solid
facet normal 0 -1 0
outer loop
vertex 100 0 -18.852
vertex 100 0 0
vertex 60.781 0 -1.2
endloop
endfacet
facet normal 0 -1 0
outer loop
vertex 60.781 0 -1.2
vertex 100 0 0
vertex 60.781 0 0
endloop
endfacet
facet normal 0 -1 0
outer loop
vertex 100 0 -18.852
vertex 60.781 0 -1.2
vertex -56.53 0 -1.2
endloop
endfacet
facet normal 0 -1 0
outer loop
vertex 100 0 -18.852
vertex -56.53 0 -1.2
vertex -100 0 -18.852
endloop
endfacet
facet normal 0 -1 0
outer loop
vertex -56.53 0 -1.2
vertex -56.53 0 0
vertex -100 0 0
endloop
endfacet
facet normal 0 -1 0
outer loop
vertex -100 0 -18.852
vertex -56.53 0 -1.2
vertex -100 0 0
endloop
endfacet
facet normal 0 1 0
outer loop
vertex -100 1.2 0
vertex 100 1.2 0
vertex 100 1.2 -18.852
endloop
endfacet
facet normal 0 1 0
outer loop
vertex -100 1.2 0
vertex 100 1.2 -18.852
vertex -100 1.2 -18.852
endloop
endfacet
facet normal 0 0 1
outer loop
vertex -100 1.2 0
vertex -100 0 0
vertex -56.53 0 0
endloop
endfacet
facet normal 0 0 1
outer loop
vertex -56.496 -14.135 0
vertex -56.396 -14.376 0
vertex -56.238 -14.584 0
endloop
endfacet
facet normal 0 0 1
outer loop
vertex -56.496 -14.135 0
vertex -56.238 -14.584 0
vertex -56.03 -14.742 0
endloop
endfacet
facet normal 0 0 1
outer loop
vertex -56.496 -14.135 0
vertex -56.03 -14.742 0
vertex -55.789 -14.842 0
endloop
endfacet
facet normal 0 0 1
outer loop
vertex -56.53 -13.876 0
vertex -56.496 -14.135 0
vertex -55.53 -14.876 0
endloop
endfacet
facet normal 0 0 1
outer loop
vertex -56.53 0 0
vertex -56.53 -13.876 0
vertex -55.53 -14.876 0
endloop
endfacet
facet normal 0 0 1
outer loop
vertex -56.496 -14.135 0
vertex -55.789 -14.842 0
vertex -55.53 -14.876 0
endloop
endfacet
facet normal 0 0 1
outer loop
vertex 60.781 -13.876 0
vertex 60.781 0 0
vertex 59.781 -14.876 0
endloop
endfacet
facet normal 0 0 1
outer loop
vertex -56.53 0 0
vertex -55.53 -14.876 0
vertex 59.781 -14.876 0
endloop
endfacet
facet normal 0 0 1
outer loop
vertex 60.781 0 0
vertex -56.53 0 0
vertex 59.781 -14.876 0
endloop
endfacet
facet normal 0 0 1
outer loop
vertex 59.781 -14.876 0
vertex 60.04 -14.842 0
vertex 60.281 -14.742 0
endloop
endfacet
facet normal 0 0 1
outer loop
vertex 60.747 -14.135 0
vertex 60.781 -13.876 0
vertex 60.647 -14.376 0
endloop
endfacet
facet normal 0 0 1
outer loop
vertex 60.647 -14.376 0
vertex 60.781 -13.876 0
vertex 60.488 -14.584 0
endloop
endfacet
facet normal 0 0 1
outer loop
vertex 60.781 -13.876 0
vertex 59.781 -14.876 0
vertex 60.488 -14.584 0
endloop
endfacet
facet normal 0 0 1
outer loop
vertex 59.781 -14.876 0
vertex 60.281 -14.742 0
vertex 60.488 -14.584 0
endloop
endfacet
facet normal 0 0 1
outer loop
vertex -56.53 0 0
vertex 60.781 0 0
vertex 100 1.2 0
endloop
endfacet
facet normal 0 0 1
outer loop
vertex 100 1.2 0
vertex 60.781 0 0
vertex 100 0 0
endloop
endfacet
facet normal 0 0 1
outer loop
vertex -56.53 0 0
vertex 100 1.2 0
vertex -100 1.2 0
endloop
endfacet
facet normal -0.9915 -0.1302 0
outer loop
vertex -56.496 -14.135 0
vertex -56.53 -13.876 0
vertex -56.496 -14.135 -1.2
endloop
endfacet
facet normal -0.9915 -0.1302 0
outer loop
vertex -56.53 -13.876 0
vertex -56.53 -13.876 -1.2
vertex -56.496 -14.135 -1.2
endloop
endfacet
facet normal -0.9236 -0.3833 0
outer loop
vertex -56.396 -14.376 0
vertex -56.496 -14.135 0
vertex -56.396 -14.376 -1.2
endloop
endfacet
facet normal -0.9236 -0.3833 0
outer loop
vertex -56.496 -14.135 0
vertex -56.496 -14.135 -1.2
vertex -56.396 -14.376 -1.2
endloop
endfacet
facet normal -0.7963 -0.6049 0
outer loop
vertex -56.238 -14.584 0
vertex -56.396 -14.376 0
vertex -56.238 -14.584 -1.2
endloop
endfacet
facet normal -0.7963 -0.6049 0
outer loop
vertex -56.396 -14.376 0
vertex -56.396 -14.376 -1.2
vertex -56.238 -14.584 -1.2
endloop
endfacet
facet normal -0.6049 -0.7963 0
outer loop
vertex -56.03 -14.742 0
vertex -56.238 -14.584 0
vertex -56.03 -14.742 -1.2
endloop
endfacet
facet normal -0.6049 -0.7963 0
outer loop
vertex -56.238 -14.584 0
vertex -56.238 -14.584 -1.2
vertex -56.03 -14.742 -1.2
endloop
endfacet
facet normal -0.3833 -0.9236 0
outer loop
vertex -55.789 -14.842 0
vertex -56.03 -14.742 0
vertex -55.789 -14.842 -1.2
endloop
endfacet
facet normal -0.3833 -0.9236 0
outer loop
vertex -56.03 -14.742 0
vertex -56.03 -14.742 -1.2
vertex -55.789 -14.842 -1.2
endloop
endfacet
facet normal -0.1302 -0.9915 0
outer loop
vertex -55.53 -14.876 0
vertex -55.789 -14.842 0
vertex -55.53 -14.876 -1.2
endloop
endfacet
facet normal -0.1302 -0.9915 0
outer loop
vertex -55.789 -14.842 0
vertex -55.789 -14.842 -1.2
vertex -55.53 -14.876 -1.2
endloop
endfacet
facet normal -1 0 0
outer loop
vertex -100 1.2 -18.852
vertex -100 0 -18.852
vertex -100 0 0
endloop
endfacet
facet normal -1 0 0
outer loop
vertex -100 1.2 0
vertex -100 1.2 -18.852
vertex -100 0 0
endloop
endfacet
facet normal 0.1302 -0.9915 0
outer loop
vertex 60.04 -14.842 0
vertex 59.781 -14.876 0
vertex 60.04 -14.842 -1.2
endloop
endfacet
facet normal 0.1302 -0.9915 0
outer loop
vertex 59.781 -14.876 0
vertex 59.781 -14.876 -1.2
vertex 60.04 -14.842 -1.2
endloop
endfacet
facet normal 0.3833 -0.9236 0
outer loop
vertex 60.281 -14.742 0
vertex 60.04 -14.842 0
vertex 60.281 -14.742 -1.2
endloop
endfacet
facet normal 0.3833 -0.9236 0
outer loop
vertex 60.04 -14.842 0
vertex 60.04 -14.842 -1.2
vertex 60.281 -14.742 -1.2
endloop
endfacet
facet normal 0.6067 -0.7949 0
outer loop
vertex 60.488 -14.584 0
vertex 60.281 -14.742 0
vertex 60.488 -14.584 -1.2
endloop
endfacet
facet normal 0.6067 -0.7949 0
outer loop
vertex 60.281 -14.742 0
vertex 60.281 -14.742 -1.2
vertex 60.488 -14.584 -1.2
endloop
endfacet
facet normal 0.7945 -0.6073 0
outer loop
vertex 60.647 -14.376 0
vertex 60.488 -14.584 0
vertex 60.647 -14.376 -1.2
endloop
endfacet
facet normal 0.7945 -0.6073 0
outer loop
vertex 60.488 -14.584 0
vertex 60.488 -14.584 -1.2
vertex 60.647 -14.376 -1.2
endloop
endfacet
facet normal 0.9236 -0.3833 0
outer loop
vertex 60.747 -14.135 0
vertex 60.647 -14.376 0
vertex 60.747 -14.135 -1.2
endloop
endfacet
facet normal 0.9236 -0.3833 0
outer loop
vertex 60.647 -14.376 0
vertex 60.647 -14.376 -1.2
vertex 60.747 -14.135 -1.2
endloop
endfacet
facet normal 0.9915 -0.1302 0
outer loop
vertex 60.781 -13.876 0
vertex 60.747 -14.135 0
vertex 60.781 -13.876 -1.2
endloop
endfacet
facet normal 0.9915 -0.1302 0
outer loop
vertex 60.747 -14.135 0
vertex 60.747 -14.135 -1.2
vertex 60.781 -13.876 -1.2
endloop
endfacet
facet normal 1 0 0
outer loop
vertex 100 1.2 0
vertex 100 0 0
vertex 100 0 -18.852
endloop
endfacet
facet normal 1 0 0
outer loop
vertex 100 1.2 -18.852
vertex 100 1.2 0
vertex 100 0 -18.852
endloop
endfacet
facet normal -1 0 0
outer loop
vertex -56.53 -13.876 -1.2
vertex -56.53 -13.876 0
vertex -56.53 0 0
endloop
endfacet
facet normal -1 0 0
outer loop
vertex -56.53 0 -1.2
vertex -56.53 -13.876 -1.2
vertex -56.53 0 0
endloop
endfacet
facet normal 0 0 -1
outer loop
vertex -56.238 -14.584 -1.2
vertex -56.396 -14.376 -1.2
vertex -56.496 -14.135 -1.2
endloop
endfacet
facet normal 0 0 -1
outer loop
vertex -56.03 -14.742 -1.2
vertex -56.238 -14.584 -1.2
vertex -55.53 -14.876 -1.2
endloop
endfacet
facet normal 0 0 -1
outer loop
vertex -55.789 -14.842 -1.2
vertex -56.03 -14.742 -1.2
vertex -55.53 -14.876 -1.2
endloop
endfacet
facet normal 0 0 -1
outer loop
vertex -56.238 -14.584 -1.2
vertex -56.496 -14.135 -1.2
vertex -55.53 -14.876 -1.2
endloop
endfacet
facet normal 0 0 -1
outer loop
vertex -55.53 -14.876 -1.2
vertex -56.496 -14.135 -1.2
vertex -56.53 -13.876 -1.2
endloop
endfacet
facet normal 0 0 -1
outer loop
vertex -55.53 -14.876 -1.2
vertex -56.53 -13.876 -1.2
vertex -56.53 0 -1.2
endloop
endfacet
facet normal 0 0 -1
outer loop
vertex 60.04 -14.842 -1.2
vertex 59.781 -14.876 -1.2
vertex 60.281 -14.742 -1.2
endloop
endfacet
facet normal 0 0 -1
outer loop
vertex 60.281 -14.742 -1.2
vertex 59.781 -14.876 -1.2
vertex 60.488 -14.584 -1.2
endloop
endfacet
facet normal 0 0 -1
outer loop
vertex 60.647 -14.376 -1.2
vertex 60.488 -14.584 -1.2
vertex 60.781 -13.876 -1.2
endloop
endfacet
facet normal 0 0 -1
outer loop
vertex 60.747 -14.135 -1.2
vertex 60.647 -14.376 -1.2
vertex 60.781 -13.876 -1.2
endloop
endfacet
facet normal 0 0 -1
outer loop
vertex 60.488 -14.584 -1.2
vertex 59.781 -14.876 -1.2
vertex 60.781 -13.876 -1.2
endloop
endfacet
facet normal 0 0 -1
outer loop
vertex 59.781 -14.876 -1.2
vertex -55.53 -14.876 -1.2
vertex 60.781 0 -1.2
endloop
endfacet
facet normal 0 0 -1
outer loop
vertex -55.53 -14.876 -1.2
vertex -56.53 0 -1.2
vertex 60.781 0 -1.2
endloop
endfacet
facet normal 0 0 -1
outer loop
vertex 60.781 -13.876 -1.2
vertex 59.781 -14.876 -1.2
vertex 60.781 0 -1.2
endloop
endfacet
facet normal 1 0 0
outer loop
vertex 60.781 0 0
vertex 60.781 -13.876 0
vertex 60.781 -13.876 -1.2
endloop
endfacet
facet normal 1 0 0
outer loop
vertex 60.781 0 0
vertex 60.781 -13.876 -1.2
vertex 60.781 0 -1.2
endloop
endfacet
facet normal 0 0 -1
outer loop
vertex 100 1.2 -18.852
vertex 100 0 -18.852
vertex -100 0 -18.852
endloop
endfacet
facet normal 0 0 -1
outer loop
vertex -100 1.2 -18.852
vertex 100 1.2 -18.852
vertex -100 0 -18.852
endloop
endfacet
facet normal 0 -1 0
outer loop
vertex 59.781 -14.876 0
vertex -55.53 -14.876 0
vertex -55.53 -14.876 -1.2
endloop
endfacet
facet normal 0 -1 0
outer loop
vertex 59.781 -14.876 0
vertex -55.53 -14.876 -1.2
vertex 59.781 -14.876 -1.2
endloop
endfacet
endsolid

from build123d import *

# Parameters (mm, degrees)
F0_W     = 117.3113062978
F0_H     = 14.8764327168
F1_DEPTH = 1.2
F2_R     = 1
F4_DEPTH = 1.2


with BuildPart() as f1:
    # F0 (on Top) → F1 (new body)
    with BuildSketch(Plane.XY):
        with Locations((2.1252036095, -7.4382163584)):
            Rectangle(F0_W, F0_H)
    extrude(amount=-F1_DEPTH)

    # F2
    f2_edges = [f1.edges().sort_by_distance(p)[0] for p in [
        (-56.53045, -14.876433, -0.6),
        (60.780857, -14.876433, -0.6),
    ]]
    fillet(f2_edges, radius=F2_R)

    # F3 (on face) → F4 (join)
    with BuildSketch(Plane(origin=(0, 0, 0), x_dir=(-1, 0, 0), z_dir=(0, 1, 0))):
        Polygon((-60.7808567584, -1.2), (-60.7808567584, 0), (-100, 0), (-100, -18.8519991934), (100, -18.8519991934), (100, 0), (56.5304495394, 0), (56.5304495394, -1.2), align=None)
        Polygon((56.5304495394, 0), (0, 0), (-60.7808567584, 0), (-60.7808567584, -1.2), (56.5304495394, -1.2), align=None)
    extrude(amount=F4_DEPTH)


solid = f1.part
